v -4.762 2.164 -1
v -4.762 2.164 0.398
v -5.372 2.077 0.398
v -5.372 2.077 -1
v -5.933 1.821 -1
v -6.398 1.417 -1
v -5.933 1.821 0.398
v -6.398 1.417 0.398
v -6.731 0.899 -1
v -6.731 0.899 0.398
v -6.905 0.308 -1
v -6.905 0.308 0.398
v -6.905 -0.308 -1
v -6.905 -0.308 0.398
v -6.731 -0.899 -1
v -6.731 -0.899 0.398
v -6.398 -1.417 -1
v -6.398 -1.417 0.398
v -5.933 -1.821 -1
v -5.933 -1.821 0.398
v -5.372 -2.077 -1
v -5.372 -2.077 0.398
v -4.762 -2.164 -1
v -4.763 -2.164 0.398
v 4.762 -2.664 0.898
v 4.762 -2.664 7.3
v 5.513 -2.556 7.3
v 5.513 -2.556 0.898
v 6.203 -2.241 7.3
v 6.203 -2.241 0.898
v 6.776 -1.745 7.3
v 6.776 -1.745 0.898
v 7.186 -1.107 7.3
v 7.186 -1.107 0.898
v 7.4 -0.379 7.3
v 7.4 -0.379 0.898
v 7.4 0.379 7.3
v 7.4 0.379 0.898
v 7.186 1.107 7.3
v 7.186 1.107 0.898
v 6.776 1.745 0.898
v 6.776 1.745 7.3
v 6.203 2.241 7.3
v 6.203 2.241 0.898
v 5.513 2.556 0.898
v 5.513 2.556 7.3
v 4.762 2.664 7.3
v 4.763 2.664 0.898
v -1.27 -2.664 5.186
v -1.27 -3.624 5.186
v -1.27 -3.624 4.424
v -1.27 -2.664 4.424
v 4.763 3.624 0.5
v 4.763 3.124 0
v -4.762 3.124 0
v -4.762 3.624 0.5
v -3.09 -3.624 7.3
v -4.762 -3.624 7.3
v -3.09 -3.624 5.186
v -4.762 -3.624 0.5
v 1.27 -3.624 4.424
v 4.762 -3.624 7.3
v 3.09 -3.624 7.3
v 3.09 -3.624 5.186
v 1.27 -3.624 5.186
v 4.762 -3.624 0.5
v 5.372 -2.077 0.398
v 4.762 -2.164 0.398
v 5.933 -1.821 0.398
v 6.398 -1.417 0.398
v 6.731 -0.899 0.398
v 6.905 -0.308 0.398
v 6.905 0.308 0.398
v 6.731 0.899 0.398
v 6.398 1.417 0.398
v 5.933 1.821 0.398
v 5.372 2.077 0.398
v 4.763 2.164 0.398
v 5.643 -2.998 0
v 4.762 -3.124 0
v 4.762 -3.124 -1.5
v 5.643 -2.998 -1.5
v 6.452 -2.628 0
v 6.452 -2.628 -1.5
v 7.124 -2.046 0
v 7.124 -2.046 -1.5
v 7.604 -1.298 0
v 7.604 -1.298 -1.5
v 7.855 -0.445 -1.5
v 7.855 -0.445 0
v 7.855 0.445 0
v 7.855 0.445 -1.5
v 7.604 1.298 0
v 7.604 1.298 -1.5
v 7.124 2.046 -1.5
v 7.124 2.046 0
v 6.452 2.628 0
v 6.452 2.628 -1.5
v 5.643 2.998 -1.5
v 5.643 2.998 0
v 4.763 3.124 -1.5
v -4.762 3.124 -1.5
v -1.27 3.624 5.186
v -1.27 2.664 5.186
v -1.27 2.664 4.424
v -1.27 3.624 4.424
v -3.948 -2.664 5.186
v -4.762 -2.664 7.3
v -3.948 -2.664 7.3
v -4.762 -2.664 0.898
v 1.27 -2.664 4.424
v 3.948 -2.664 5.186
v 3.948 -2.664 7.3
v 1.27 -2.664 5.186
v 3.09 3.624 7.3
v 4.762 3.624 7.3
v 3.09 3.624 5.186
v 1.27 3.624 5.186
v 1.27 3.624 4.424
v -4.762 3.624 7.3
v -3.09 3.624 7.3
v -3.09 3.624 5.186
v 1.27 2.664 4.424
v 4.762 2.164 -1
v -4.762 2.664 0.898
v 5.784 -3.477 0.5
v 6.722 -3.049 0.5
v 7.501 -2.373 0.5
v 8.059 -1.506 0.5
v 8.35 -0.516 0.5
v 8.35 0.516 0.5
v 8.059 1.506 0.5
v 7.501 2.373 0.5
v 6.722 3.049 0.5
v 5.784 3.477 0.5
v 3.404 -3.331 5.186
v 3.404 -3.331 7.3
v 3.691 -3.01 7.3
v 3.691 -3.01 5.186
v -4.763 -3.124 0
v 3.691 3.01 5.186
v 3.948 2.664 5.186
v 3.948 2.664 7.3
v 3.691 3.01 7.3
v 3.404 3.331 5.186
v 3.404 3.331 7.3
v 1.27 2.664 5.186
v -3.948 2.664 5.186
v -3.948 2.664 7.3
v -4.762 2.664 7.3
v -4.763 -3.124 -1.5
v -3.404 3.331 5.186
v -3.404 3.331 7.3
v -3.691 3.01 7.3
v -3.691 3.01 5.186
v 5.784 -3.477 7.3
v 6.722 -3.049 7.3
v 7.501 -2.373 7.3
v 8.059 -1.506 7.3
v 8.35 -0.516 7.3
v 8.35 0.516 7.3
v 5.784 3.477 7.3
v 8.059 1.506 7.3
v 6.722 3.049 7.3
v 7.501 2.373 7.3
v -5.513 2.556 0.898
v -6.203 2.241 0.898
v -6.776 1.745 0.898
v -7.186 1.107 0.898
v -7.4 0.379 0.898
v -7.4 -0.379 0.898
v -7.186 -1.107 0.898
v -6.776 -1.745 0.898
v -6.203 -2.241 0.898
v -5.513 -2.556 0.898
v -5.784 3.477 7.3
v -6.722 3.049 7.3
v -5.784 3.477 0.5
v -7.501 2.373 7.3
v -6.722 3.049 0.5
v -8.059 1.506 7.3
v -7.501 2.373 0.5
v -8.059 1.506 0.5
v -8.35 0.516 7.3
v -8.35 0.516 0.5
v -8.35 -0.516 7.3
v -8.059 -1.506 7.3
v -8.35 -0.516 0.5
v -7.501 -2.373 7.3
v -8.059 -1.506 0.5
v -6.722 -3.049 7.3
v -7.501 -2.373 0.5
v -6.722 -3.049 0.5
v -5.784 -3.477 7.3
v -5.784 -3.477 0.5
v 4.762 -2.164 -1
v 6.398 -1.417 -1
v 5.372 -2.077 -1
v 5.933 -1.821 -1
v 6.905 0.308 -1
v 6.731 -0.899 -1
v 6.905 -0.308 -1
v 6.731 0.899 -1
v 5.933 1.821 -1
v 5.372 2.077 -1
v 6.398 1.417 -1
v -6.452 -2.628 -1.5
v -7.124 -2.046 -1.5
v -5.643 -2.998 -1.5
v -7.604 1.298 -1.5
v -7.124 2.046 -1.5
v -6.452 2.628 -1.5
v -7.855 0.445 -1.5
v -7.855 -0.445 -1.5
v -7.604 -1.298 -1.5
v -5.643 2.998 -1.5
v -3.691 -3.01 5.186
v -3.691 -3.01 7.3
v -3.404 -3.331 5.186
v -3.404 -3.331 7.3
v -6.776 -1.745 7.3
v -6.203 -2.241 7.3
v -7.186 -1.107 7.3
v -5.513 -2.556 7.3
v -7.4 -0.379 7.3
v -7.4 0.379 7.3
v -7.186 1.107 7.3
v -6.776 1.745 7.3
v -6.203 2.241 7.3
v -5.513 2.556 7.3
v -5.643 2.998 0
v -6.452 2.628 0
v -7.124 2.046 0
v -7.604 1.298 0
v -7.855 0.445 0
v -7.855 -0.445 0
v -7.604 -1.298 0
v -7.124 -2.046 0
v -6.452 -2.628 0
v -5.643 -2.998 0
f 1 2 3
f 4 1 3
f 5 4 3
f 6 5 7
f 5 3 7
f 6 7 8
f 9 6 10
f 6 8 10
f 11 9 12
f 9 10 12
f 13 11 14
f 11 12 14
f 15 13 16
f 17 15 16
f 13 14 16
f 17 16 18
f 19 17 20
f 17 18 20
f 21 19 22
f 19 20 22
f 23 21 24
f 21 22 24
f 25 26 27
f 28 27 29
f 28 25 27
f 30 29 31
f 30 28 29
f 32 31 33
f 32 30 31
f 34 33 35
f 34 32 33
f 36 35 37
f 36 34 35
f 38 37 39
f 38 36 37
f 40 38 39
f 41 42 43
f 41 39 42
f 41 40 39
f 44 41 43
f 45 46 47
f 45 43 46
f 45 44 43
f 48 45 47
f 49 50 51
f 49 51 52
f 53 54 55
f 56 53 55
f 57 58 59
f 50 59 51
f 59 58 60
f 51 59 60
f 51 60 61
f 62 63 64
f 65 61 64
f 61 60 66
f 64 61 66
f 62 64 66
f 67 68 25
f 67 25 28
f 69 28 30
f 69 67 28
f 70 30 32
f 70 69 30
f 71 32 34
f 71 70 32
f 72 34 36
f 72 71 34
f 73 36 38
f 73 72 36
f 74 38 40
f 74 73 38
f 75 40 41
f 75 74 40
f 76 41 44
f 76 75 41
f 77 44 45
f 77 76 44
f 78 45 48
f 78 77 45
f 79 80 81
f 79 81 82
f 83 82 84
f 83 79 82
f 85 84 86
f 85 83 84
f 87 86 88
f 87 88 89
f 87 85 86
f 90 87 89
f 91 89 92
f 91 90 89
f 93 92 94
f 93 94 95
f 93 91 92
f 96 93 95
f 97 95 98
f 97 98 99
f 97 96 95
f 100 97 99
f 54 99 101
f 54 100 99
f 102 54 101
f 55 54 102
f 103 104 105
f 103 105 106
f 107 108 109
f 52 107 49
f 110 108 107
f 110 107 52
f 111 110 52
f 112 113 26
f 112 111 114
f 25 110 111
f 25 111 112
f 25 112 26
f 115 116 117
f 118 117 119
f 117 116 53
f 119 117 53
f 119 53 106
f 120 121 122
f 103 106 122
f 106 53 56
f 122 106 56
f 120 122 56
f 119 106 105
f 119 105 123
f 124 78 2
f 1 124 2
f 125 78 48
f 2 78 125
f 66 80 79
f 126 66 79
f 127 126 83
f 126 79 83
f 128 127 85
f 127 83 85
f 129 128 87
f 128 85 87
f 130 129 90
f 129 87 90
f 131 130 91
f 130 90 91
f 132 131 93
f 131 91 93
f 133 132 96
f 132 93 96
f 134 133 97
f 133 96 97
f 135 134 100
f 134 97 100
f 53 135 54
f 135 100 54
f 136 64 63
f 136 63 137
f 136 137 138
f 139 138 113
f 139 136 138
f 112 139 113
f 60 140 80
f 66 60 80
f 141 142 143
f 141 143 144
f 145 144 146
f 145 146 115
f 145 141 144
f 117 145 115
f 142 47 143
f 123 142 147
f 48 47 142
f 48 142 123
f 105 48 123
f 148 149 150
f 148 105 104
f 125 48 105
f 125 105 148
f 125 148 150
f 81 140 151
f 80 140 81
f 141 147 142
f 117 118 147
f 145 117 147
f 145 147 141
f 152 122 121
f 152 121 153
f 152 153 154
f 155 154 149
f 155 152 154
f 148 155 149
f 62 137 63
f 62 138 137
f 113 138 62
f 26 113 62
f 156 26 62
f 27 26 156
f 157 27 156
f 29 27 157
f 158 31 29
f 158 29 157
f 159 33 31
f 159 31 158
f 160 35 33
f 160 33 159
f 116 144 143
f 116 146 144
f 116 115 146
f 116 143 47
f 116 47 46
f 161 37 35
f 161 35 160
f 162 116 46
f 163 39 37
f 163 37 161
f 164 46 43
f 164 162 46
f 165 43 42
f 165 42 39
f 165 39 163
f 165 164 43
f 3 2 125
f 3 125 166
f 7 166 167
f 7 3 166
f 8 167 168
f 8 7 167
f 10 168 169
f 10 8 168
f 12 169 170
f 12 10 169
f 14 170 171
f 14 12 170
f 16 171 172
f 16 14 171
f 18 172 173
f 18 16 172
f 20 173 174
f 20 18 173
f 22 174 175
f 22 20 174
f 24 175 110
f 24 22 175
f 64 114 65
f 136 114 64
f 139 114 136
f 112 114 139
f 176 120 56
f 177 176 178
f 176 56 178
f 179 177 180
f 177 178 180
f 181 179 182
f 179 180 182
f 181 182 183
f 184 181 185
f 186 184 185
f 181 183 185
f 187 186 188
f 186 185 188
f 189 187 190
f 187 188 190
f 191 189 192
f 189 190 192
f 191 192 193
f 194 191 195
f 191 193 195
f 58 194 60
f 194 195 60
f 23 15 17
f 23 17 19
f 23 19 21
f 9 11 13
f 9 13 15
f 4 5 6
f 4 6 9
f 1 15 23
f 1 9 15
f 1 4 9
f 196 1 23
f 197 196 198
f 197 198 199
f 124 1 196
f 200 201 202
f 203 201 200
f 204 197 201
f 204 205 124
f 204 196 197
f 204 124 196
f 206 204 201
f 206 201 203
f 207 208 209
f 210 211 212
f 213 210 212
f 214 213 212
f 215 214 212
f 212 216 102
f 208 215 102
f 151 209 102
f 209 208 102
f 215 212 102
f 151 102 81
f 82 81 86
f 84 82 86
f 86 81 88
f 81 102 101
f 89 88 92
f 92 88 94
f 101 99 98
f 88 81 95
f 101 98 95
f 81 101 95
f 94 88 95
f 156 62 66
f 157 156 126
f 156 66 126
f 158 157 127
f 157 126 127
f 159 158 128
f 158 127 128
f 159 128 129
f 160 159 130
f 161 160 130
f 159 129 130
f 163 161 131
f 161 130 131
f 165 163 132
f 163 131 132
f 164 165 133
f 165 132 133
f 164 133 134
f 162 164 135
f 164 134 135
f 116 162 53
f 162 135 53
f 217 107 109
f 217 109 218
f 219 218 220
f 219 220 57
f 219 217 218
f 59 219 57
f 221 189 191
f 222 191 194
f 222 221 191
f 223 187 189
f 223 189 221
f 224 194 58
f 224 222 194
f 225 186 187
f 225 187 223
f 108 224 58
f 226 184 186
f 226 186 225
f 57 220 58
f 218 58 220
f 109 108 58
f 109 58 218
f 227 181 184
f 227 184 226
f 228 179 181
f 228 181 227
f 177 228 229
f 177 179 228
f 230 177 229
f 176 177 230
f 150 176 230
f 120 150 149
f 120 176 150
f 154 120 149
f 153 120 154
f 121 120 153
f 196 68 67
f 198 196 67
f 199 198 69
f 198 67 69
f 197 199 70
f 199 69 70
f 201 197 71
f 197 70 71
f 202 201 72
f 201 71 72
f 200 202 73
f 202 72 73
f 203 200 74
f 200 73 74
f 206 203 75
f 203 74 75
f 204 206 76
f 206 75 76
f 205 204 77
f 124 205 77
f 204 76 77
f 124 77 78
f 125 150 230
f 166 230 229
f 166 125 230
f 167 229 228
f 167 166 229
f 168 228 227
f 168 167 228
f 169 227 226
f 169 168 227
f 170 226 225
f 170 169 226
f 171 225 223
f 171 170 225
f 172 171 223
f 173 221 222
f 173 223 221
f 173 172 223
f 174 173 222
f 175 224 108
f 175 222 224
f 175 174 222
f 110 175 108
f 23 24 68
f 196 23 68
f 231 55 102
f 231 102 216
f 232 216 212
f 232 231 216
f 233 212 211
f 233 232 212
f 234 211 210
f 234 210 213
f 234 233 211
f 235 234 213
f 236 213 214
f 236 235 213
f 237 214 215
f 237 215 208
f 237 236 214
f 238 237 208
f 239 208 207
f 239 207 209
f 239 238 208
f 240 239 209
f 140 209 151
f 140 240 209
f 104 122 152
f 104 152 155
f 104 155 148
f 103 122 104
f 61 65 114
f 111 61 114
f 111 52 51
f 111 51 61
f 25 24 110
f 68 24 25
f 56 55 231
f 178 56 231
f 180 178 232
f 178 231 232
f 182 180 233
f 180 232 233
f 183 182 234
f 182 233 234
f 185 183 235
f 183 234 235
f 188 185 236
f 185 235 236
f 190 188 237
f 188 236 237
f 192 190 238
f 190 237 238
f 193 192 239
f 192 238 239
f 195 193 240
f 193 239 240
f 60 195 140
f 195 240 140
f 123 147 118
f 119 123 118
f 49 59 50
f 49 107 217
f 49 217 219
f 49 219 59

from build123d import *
from OCP.BRepAlgoAPI import BRepAlgoAPI_Cut
from OCP.TopTools import TopTools_ListOfShape

# Parameters (mm, degrees)
BOSS_EXTRUDE1_DEPTH      = 1.5
BOSS_EXTRUDE3_DEPTH      = 0.5
BOSS_EXTRUDE3_DRAFT      = -45
BOSS_EXTRUDE4_DEPTH      = 6.8
SHELL1_T                 = -0.96
SHELL1_THICKNESS_2_DEPTH = 0.46
CUT_EXTRUDE1_START       = -2.114122
CUT_EXTRUDE1_DEPTH       = 2.114122
SKETCH5_W                = 2.54
SKETCH5_H                = 7.2484
CUT_EXTRUDE2_DEPTH       = 0.762


with BuildPart() as part:
    # Sketch2 → Boss-Extrude1 (new body)
    with BuildSketch(Plane.XY):
        with BuildLine():
            Line((-4.7625, -3.1242), (4.7625, -3.1242))
            ThreePointArc((4.7625, -3.1242), (7.8867, 0), (4.7625, 3.1242))
            Line((4.7625, 3.1242), (-4.7625, 3.1242))
            ThreePointArc((-4.7625, 3.1242), (-7.8867, 0), (-4.7625, -3.1242))
        make_face()
    extrude(amount=-BOSS_EXTRUDE1_DEPTH)


with BuildPart() as boss_extrude3_tool:
    # Sketch2<3> → Boss-Extrude3 (with draft: the straight prism first)
    with BuildSketch(Plane.XY):
        with BuildLine():
            Line((-4.7625, -3.1242), (4.7625, -3.1242))
            ThreePointArc((4.7625, -3.1242), (7.8867, 0), (4.7625, 3.1242))
            Line((4.7625, 3.1242), (-4.7625, 3.1242))
            ThreePointArc((-4.7625, 3.1242), (-7.8867, 0), (-4.7625, -3.1242))
        make_face()
    extrude(amount=BOSS_EXTRUDE3_DEPTH)
    # Boss-Extrude3: the draft: its side faces are tilted about the plane it starts from
    boss_extrude3_sides = [boss_extrude3_tool.faces().sort_by_distance(p)[0] for p in [
        (0, -3.1242, 0.25),
        (7.8867, 0, 0.25),
        (0, 3.1242, 0.25),
        (-7.8867, 0, 0.25),
    ]]
    draft(boss_extrude3_sides, Plane.XY, BOSS_EXTRUDE3_DRAFT)


with BuildPart() as part_1:
    add(part.part)

    # Boss-Extrude3: add boss_extrude3_tool
    add(boss_extrude3_tool.part)

    # Sketch3 → Boss-Extrude4 (add)
    with BuildSketch(Plane.XY.offset(0.5)):
        with BuildLine():
            Line((-4.7625, -3.6242), (4.7625, -3.6242))
            ThreePointArc((4.7625, -3.6242), (8.3867, 0), (4.7625, 3.6242))
            Line((4.7625, 3.6242), (-4.7625, 3.6242))
            ThreePointArc((-4.7625, 3.6242), (-8.3867, 0), (-4.7625, -3.6242))
        make_face()
    extrude(amount=BOSS_EXTRUDE4_DEPTH)

    # Shell1
    shell1_openings = [part_1.faces().sort_by_distance(p)[0] for p in [
        (0, 0, 7.3),
    ]]
    offset(amount=SHELL1_T, openings=shell1_openings, kind=Kind.INTERSECTION)

    # Shell1 thickness 2 face (on inner face of the shell) → Shell1 thickness 2 (cut)
    with BuildSketch(Plane(origin=(0, 0, -0.54), x_dir=(-1, 0, 0), z_dir=(0, 0, -1))):
        with BuildLine():
            Line((-4.7625, 2.1642), (4.7625, 2.1642))
            ThreePointArc((4.7625, 2.1642), (6.9267, 0), (4.7625, -2.1642))
            Line((4.7625, -2.1642), (-4.7625, -2.1642))
            ThreePointArc((-4.7625, -2.1642), (-6.9267, 0), (-4.7625, 2.1642))
        make_face()
    extrude(amount=SHELL1_THICKNESS_2_DEPTH, mode=Mode.SUBTRACT)

    # Sketch4 → Cut-Extrude1 (cut)
    with BuildSketch(Plane.XY.offset(7.3).offset(CUT_EXTRUDE1_START)):
        with BuildLine():
            Line((1.3335, 4.572), (-1.3335, 4.572))
            ThreePointArc((-1.3335, 4.572), (-3.367596045, 3.367596045), (-4.572, 1.3335))
            Line((-4.572, 1.3335), (-4.572, -1.3335))
            ThreePointArc((-4.572, -1.3335), (-3.367596045, -3.367596045), (-1.3335, -4.572))
            Line((-1.3335, -4.572), (1.3335, -4.572))
            ThreePointArc((1.3335, -4.572), (3.367596045, -3.367596045), (4.572, -1.3335))
            Line((4.572, -1.3335), (4.572, 1.3335))
            ThreePointArc((4.572, 1.3335), (3.367596045, 3.367596045), (1.3335, 4.572))
        make_face()
    extrude(amount=CUT_EXTRUDE1_DEPTH, mode=Mode.SUBTRACT)


with BuildPart() as cut_extrude2_tool:
    # Sketch5 → Cut-Extrude2 (new body)
    with BuildSketch(Plane.XY.offset(5.185877531)):
        Rectangle(SKETCH5_W, SKETCH5_H)
    extrude(amount=-CUT_EXTRUDE2_DEPTH)


with BuildPart() as part_2:
    add(part_1.part)

    # Cut-Extrude2: cut by cut_extrude2_tool, with a tolerance
    cut_extrude2_stock = TopTools_ListOfShape()
    cut_extrude2_stock.Append(part_2.part.wrapped)
    cut_extrude2_tools = TopTools_ListOfShape()
    cut_extrude2_tools.Append(cut_extrude2_tool.part.wrapped)
    cut_extrude2_cut = BRepAlgoAPI_Cut()
    cut_extrude2_cut.SetArguments(cut_extrude2_stock)
    cut_extrude2_cut.SetTools(cut_extrude2_tools)
    cut_extrude2_cut.SetFuzzyValue(0.00001)
    cut_extrude2_cut.Build()
    add(Compound.cast(cut_extrude2_cut.Shape()).solids(), mode=Mode.REPLACE)


solid = part_2.part
